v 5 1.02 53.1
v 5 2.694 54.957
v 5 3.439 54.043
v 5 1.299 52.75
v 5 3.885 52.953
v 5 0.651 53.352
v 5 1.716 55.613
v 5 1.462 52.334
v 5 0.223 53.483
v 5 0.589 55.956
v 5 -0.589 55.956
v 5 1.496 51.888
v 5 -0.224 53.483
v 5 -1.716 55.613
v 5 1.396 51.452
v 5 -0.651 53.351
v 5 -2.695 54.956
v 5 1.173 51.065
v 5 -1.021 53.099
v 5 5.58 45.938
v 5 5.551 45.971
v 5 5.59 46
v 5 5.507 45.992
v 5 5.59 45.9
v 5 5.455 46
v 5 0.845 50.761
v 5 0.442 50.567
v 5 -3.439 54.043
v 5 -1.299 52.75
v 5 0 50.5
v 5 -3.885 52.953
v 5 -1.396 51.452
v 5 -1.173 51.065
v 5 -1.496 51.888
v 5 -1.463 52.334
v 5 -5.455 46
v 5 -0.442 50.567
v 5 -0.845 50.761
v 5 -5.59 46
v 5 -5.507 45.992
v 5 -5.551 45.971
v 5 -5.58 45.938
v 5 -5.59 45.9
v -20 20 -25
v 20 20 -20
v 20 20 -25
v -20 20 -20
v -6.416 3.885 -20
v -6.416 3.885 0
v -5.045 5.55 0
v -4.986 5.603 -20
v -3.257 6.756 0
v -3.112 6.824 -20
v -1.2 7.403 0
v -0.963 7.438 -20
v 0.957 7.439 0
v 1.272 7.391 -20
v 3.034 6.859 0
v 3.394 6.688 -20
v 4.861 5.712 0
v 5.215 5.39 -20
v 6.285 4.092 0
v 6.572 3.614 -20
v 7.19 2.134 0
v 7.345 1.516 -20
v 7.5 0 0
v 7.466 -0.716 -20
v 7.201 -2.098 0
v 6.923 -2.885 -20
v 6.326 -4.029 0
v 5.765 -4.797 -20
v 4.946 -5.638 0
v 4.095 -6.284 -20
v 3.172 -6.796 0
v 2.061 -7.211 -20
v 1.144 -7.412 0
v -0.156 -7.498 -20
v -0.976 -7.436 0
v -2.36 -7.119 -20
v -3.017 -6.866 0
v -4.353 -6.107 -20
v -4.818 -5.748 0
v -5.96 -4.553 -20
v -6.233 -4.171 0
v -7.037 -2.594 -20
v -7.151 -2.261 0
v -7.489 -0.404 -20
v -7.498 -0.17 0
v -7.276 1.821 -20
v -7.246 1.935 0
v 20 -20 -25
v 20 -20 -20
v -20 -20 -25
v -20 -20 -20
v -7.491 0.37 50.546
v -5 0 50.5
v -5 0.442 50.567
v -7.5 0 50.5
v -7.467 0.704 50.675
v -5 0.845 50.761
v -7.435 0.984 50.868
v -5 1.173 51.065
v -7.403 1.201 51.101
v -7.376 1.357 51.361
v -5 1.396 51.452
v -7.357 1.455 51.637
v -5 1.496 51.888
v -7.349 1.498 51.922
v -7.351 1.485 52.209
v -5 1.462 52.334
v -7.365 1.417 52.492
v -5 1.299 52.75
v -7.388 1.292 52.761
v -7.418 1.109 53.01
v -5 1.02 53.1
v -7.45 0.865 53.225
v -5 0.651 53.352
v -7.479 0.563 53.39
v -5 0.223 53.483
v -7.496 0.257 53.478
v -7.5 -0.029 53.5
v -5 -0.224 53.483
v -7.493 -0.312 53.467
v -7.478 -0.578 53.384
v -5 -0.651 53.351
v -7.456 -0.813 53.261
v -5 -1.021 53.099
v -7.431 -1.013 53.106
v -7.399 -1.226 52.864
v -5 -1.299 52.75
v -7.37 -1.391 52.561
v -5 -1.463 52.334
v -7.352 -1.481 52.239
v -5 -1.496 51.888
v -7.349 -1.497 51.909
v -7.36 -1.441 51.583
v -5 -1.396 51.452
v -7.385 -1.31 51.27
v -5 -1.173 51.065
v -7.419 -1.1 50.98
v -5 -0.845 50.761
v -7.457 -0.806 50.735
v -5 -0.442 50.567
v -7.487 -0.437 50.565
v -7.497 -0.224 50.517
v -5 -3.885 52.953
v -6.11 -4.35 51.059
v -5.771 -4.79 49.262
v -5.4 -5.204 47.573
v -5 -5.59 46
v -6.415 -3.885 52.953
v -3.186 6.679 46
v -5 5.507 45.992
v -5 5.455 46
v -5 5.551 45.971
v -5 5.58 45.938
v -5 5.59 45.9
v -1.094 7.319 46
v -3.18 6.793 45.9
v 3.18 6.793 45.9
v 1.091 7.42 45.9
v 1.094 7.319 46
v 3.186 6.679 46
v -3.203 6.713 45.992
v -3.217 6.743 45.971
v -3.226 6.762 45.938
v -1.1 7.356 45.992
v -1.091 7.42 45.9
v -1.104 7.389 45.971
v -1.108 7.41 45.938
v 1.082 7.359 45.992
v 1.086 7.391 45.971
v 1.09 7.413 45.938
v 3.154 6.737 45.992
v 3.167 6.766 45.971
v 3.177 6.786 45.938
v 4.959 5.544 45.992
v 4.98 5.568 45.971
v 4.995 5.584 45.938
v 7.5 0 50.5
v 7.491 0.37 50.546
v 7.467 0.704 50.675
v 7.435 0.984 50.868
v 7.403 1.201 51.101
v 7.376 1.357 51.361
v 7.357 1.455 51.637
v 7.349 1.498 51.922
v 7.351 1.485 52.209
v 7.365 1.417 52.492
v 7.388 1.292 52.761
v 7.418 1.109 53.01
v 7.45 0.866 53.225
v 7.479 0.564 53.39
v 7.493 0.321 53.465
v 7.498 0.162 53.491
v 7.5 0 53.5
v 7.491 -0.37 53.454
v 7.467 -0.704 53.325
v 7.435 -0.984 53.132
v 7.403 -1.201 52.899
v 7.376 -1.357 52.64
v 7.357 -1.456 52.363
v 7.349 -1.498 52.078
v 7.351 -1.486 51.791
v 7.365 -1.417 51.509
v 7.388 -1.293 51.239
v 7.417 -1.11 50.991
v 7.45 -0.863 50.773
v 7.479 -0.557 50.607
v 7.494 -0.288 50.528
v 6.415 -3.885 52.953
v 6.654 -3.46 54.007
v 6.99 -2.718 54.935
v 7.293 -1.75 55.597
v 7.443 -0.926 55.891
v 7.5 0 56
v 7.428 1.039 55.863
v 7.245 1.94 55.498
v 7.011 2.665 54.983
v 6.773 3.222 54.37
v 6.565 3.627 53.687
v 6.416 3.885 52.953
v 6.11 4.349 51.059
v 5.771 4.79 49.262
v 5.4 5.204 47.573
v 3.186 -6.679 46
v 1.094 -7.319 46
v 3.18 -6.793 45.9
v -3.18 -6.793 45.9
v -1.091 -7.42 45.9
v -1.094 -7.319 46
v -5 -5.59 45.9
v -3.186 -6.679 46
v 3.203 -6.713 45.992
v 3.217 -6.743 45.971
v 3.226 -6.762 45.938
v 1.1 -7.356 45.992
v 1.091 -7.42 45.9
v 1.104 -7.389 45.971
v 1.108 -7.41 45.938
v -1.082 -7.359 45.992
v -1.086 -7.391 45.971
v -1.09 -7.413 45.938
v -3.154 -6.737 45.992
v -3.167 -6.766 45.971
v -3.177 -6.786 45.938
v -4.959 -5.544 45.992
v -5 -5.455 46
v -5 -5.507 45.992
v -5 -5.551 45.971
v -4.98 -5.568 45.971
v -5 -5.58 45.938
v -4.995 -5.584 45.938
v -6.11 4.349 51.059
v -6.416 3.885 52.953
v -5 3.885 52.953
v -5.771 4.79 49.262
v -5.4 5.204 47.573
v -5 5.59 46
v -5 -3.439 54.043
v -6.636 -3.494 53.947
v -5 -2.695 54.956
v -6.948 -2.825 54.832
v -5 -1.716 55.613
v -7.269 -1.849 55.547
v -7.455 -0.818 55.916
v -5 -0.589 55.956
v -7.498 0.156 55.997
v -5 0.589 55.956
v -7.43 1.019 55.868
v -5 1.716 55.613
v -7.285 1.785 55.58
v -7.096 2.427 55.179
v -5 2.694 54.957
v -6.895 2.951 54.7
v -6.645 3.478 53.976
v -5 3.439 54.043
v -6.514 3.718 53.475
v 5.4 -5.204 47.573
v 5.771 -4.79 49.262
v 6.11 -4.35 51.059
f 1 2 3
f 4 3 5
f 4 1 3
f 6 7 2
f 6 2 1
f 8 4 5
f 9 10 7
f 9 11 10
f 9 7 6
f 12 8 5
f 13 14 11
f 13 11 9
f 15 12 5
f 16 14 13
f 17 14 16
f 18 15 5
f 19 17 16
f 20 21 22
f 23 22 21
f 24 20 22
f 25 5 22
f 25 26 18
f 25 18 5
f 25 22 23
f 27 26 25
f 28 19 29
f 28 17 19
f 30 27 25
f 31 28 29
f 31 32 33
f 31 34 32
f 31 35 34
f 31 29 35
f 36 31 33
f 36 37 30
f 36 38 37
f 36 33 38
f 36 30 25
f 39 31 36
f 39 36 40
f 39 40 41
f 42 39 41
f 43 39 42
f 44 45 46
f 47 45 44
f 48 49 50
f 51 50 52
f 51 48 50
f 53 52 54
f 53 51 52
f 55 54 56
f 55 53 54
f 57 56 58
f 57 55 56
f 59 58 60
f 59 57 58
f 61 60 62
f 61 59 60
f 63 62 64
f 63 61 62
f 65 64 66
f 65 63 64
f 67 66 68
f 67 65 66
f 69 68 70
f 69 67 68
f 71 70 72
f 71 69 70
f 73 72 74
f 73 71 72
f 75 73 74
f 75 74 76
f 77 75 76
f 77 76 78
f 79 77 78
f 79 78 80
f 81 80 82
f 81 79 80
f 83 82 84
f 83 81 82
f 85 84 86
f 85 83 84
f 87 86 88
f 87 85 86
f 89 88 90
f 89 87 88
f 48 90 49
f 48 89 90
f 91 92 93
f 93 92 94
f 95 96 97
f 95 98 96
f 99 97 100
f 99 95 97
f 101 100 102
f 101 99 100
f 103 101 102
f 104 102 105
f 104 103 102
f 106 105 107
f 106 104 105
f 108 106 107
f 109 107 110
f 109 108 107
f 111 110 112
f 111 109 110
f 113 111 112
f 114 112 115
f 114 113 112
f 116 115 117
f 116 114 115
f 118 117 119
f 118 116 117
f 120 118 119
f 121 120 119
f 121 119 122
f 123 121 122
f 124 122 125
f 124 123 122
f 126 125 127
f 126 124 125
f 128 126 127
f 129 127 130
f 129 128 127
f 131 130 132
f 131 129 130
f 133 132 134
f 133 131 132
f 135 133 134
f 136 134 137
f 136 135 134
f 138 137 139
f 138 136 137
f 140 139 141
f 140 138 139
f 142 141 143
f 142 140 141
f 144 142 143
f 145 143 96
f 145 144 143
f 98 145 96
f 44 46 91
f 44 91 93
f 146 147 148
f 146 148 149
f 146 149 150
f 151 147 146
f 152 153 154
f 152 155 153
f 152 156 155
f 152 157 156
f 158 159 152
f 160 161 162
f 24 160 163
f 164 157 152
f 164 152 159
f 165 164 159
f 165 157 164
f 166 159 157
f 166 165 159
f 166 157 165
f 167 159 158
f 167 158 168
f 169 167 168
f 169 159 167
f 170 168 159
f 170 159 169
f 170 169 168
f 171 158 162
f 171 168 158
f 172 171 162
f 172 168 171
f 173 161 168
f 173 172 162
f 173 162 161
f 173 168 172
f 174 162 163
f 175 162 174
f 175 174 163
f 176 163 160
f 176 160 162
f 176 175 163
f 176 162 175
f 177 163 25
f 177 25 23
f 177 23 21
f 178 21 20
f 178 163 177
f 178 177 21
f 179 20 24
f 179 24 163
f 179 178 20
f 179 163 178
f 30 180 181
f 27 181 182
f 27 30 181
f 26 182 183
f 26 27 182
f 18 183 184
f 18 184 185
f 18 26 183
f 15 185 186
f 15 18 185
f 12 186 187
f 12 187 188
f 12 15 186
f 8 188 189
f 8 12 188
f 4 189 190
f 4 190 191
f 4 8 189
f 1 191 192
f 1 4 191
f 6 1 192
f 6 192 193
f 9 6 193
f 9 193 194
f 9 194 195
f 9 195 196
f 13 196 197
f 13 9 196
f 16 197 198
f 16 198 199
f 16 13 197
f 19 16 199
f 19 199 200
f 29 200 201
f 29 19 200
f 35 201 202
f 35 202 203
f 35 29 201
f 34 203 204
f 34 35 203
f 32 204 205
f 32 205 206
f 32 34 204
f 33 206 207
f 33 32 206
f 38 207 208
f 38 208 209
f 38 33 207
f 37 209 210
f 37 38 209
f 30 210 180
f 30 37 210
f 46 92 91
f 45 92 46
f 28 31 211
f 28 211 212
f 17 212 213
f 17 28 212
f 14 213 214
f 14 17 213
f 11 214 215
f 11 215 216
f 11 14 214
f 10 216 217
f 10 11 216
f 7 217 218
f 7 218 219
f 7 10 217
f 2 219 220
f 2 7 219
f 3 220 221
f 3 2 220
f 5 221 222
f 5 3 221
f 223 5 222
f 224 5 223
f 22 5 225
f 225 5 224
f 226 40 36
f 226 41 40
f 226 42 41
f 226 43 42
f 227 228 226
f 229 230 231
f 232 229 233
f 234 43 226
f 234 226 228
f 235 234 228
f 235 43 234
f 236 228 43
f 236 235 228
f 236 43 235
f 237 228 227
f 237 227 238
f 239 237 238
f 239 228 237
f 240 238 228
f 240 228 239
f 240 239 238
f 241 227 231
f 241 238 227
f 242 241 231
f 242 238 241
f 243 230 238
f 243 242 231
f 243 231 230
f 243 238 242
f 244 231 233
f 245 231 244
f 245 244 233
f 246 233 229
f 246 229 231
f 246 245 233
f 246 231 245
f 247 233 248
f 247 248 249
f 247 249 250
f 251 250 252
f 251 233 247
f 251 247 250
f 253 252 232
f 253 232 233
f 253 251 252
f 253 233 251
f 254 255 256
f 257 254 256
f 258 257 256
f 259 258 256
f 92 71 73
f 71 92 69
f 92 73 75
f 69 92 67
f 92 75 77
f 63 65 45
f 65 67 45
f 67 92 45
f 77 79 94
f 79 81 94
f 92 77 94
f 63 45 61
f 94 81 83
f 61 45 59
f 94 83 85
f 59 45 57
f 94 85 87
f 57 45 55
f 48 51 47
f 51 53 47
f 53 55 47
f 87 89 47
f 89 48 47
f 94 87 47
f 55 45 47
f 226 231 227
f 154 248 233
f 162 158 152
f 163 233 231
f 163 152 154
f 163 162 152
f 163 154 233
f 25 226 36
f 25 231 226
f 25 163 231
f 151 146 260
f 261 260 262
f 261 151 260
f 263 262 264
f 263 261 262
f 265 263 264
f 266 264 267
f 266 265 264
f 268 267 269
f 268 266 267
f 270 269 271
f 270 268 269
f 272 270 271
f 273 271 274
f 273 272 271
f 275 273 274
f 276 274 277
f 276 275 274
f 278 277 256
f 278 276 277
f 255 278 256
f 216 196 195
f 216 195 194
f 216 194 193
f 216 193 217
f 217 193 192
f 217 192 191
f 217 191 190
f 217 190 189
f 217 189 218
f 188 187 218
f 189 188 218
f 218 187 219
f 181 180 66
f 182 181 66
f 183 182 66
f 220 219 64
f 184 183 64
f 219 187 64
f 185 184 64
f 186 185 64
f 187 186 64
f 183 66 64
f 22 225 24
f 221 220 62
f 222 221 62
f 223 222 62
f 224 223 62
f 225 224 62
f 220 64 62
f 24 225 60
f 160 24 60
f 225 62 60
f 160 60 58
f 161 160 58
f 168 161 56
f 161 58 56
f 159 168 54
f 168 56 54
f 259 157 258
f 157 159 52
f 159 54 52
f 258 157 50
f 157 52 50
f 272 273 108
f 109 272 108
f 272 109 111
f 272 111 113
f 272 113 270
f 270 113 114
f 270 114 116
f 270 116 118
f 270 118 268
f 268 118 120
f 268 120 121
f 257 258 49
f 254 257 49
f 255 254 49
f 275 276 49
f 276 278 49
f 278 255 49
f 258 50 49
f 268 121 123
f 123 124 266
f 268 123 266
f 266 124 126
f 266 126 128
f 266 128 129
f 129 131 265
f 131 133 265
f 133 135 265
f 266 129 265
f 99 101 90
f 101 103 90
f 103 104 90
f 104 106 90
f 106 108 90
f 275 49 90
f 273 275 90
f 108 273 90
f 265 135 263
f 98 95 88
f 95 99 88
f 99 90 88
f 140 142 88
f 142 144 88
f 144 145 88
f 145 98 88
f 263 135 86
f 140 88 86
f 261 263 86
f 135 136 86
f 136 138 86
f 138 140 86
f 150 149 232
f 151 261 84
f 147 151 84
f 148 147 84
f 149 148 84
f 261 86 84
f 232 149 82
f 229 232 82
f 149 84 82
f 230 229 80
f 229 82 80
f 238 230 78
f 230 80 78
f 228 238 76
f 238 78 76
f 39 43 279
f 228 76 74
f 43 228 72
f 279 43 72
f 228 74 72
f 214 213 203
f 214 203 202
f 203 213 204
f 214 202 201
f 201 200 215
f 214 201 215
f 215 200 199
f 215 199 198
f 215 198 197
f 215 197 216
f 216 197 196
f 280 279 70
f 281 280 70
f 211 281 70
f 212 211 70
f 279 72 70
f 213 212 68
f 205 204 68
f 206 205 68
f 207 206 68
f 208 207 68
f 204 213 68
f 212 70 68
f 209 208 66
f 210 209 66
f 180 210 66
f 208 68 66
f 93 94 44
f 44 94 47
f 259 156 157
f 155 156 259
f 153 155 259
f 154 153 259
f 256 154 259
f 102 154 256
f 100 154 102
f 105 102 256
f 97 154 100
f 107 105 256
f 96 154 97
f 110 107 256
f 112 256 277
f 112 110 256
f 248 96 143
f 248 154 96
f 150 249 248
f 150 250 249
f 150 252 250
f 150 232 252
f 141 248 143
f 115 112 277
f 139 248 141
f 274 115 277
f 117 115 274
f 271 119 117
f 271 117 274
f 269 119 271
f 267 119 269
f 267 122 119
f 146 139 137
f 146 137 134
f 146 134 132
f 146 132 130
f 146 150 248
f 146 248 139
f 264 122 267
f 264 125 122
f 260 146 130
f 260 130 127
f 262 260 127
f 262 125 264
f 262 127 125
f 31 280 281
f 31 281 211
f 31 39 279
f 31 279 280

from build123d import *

# Parameters (mm, degrees)
SKETCH1_R               = 7.5
BOSS_EXTRUDE1_DEPTH     = 56
SKETCH2_W               = 10
SKETCH2_H               = 16
CUT_EXTRUDE1_DEPTH      = 10
CUT_EXTRUDE4_DEPTH      = 57.995613866
CUT_EXTRUDE4_DEPTH_BACK = 57.995613866
CUT_EXTRUDE5_DEPTH      = 57.995613991
CUT_EXTRUDE5_DEPTH_BACK = 57.995613991
SKETCH4_R               = 1.5
FILLET1_R               = 0.1
SKETCH5_W               = 7.5
SKETCH5_H               = 20
SKETCH6_W               = 40
SKETCH6_H               = 40
BOSS_EXTRUDE2_DEPTH     = 5


with BuildPart() as part:
    # Sketch1 → Boss-Extrude1 (new body)
    with BuildSketch(Plane.XY):
        Circle(SKETCH1_R)
    extrude(amount=BOSS_EXTRUDE1_DEPTH)

    # Sketch2 → Cut-Extrude1 (cut)
    with BuildSketch(Plane.XY.offset(56)):
        Rectangle(SKETCH2_W, SKETCH2_H)
    extrude(amount=-CUT_EXTRUDE1_DEPTH, mode=Mode.SUBTRACT)

    # Sketch3 → Cut-Extrude4 (cut, two sides: drawn at the far end of the back side and taken through both)
    with BuildSketch(Plane(origin=(0, 0, 0), x_dir=(0, 0, -1), z_dir=(1, 0, 0)).offset(-CUT_EXTRUDE4_DEPTH_BACK)):
        with BuildLine():
            Line((-46, -114.267763227), (-46, -7.5))
            Line((-46, -7.5), (-46, -5.590169944))
            Line((-46, -5.590169944), (-52.952744721, -3.885047998))
            ThreePointArc((-52.952744721, -3.885047998), (-55.999999999, -0.000262165), (-52.952923855, 3.884664175))
            Line((-52.952923855, 3.884664175), (-46, 5.590169944))
            Line((-46, 5.590169944), (-46, 7.5))
            Line((-46, 7.5), (-46, 114.267763227))
            Line((-46, 114.267763227), (-259.535526454, 114.267763227))
            Line((-259.535526454, 114.267763227), (-259.535526454, -114.267763227))
            Line((-259.535526454, -114.267763227), (-46, -114.267763227))
        make_face()
    extrude(amount=CUT_EXTRUDE4_DEPTH + CUT_EXTRUDE4_DEPTH_BACK, mode=Mode.SUBTRACT)

    # Sketch4 → Cut-Extrude5 (cut, two sides: drawn at the far end of the back side and taken through both)
    with BuildSketch(Plane(origin=(0, 0, 0), x_dir=(0, 0, -1), z_dir=(1, 0, 0)).offset(-CUT_EXTRUDE5_DEPTH_BACK)):
        with Locations(Location((-52, -0.000169944, 0), (0, 0, 0.006491373))):
            Circle(SKETCH4_R)
    extrude(amount=CUT_EXTRUDE5_DEPTH + CUT_EXTRUDE5_DEPTH_BACK, mode=Mode.SUBTRACT)

    # Fillet1
    # the kernel refuses this fillet: 0.1 mm, written as the material it takes off along each edge
    with BuildSketch(Plane(origin=(0, 0, 46), x_dir=(0.6911452834399255, -0.7227158481580054, 0), z_dir=(0.7227158481580054, 0.6911452834399255, 0))) as fillet1_piece_1_section:
        with BuildLine():
            CenterArc((7.5 - FILLET1_R, FILLET1_R), FILLET1_R, 270, 90)
            Line((7.5 - FILLET1_R, 0), (7.5, 0))
            Line((7.5, 0), (7.5, FILLET1_R))
        make_face()
    fillet1_piece_1 = revolve(axis=Axis((0, 0, 46), (0, 0, -1)), revolution_arc=87.441672972, mode=Mode.PRIVATE)
    fillet1_piece_1 = split(fillet1_piece_1, bisect_by=Plane(origin=(5, -5.569278278, 45.983069625), z_dir=(-1, 0, 0)), keep=Keep.TOP, mode=Mode.PRIVATE)
    fillet1_piece_1 = split(fillet1_piece_1, bisect_by=Plane(origin=(-5, -5.569278278, 45.983069625), z_dir=(1, 0, 0)), keep=Keep.TOP, mode=Mode.PRIVATE)
    add(fillet1_piece_1, mode=Mode.SUBTRACT)
    with BuildSketch(Plane(origin=(0, 0, 46), x_dir=(-0.6911452834399255, 0.7227158481580054, 0), z_dir=(-0.7227158481580054, -0.6911452834399255, 0))) as fillet1_piece_2_section:
        with BuildLine():
            CenterArc((7.5 - FILLET1_R, FILLET1_R), FILLET1_R, 270, 90)
            Line((7.5 - FILLET1_R, 0), (7.5, 0))
            Line((7.5, 0), (7.5, FILLET1_R))
        make_face()
    fillet1_piece_2 = revolve(axis=Axis((0, 0, 46), (0, 0, -1)), revolution_arc=87.441672972, mode=Mode.PRIVATE)
    fillet1_piece_2 = split(fillet1_piece_2, bisect_by=Plane(origin=(5, 5.569279246, 45.98306893), z_dir=(-1, 0, 0)), keep=Keep.TOP, mode=Mode.PRIVATE)
    fillet1_piece_2 = split(fillet1_piece_2, bisect_by=Plane(origin=(-5, 5.569279246, 45.98306893), z_dir=(1, 0, 0)), keep=Keep.TOP, mode=Mode.PRIVATE)
    add(fillet1_piece_2, mode=Mode.SUBTRACT)

    # Sketch5 → Revolve1 (revolve)
    with BuildSketch(Plane(origin=(0, 0, 0), x_dir=(1, 0, 0), z_dir=(0, 1, 0)), mode=Mode.PRIVATE) as revolve1_sk:
        with Locations((-3.75, 10)):
            Rectangle(SKETCH5_W, SKETCH5_H)
    revolve(revolve1_sk.sketch.rotate(Axis((0, 0, 0), (0, 0, -1)), 31.195191598), axis=Axis((0, 0, 0), (0, 0, -1)))

    # Sketch6 → Boss-Extrude2 (add)
    with BuildSketch(Plane(origin=(0, 0, -20), x_dir=(-1, 0, 0), z_dir=(0, 0, -1))):
        Rectangle(SKETCH6_W, SKETCH6_H)
    extrude(amount=BOSS_EXTRUDE2_DEPTH)


solid = part.part
